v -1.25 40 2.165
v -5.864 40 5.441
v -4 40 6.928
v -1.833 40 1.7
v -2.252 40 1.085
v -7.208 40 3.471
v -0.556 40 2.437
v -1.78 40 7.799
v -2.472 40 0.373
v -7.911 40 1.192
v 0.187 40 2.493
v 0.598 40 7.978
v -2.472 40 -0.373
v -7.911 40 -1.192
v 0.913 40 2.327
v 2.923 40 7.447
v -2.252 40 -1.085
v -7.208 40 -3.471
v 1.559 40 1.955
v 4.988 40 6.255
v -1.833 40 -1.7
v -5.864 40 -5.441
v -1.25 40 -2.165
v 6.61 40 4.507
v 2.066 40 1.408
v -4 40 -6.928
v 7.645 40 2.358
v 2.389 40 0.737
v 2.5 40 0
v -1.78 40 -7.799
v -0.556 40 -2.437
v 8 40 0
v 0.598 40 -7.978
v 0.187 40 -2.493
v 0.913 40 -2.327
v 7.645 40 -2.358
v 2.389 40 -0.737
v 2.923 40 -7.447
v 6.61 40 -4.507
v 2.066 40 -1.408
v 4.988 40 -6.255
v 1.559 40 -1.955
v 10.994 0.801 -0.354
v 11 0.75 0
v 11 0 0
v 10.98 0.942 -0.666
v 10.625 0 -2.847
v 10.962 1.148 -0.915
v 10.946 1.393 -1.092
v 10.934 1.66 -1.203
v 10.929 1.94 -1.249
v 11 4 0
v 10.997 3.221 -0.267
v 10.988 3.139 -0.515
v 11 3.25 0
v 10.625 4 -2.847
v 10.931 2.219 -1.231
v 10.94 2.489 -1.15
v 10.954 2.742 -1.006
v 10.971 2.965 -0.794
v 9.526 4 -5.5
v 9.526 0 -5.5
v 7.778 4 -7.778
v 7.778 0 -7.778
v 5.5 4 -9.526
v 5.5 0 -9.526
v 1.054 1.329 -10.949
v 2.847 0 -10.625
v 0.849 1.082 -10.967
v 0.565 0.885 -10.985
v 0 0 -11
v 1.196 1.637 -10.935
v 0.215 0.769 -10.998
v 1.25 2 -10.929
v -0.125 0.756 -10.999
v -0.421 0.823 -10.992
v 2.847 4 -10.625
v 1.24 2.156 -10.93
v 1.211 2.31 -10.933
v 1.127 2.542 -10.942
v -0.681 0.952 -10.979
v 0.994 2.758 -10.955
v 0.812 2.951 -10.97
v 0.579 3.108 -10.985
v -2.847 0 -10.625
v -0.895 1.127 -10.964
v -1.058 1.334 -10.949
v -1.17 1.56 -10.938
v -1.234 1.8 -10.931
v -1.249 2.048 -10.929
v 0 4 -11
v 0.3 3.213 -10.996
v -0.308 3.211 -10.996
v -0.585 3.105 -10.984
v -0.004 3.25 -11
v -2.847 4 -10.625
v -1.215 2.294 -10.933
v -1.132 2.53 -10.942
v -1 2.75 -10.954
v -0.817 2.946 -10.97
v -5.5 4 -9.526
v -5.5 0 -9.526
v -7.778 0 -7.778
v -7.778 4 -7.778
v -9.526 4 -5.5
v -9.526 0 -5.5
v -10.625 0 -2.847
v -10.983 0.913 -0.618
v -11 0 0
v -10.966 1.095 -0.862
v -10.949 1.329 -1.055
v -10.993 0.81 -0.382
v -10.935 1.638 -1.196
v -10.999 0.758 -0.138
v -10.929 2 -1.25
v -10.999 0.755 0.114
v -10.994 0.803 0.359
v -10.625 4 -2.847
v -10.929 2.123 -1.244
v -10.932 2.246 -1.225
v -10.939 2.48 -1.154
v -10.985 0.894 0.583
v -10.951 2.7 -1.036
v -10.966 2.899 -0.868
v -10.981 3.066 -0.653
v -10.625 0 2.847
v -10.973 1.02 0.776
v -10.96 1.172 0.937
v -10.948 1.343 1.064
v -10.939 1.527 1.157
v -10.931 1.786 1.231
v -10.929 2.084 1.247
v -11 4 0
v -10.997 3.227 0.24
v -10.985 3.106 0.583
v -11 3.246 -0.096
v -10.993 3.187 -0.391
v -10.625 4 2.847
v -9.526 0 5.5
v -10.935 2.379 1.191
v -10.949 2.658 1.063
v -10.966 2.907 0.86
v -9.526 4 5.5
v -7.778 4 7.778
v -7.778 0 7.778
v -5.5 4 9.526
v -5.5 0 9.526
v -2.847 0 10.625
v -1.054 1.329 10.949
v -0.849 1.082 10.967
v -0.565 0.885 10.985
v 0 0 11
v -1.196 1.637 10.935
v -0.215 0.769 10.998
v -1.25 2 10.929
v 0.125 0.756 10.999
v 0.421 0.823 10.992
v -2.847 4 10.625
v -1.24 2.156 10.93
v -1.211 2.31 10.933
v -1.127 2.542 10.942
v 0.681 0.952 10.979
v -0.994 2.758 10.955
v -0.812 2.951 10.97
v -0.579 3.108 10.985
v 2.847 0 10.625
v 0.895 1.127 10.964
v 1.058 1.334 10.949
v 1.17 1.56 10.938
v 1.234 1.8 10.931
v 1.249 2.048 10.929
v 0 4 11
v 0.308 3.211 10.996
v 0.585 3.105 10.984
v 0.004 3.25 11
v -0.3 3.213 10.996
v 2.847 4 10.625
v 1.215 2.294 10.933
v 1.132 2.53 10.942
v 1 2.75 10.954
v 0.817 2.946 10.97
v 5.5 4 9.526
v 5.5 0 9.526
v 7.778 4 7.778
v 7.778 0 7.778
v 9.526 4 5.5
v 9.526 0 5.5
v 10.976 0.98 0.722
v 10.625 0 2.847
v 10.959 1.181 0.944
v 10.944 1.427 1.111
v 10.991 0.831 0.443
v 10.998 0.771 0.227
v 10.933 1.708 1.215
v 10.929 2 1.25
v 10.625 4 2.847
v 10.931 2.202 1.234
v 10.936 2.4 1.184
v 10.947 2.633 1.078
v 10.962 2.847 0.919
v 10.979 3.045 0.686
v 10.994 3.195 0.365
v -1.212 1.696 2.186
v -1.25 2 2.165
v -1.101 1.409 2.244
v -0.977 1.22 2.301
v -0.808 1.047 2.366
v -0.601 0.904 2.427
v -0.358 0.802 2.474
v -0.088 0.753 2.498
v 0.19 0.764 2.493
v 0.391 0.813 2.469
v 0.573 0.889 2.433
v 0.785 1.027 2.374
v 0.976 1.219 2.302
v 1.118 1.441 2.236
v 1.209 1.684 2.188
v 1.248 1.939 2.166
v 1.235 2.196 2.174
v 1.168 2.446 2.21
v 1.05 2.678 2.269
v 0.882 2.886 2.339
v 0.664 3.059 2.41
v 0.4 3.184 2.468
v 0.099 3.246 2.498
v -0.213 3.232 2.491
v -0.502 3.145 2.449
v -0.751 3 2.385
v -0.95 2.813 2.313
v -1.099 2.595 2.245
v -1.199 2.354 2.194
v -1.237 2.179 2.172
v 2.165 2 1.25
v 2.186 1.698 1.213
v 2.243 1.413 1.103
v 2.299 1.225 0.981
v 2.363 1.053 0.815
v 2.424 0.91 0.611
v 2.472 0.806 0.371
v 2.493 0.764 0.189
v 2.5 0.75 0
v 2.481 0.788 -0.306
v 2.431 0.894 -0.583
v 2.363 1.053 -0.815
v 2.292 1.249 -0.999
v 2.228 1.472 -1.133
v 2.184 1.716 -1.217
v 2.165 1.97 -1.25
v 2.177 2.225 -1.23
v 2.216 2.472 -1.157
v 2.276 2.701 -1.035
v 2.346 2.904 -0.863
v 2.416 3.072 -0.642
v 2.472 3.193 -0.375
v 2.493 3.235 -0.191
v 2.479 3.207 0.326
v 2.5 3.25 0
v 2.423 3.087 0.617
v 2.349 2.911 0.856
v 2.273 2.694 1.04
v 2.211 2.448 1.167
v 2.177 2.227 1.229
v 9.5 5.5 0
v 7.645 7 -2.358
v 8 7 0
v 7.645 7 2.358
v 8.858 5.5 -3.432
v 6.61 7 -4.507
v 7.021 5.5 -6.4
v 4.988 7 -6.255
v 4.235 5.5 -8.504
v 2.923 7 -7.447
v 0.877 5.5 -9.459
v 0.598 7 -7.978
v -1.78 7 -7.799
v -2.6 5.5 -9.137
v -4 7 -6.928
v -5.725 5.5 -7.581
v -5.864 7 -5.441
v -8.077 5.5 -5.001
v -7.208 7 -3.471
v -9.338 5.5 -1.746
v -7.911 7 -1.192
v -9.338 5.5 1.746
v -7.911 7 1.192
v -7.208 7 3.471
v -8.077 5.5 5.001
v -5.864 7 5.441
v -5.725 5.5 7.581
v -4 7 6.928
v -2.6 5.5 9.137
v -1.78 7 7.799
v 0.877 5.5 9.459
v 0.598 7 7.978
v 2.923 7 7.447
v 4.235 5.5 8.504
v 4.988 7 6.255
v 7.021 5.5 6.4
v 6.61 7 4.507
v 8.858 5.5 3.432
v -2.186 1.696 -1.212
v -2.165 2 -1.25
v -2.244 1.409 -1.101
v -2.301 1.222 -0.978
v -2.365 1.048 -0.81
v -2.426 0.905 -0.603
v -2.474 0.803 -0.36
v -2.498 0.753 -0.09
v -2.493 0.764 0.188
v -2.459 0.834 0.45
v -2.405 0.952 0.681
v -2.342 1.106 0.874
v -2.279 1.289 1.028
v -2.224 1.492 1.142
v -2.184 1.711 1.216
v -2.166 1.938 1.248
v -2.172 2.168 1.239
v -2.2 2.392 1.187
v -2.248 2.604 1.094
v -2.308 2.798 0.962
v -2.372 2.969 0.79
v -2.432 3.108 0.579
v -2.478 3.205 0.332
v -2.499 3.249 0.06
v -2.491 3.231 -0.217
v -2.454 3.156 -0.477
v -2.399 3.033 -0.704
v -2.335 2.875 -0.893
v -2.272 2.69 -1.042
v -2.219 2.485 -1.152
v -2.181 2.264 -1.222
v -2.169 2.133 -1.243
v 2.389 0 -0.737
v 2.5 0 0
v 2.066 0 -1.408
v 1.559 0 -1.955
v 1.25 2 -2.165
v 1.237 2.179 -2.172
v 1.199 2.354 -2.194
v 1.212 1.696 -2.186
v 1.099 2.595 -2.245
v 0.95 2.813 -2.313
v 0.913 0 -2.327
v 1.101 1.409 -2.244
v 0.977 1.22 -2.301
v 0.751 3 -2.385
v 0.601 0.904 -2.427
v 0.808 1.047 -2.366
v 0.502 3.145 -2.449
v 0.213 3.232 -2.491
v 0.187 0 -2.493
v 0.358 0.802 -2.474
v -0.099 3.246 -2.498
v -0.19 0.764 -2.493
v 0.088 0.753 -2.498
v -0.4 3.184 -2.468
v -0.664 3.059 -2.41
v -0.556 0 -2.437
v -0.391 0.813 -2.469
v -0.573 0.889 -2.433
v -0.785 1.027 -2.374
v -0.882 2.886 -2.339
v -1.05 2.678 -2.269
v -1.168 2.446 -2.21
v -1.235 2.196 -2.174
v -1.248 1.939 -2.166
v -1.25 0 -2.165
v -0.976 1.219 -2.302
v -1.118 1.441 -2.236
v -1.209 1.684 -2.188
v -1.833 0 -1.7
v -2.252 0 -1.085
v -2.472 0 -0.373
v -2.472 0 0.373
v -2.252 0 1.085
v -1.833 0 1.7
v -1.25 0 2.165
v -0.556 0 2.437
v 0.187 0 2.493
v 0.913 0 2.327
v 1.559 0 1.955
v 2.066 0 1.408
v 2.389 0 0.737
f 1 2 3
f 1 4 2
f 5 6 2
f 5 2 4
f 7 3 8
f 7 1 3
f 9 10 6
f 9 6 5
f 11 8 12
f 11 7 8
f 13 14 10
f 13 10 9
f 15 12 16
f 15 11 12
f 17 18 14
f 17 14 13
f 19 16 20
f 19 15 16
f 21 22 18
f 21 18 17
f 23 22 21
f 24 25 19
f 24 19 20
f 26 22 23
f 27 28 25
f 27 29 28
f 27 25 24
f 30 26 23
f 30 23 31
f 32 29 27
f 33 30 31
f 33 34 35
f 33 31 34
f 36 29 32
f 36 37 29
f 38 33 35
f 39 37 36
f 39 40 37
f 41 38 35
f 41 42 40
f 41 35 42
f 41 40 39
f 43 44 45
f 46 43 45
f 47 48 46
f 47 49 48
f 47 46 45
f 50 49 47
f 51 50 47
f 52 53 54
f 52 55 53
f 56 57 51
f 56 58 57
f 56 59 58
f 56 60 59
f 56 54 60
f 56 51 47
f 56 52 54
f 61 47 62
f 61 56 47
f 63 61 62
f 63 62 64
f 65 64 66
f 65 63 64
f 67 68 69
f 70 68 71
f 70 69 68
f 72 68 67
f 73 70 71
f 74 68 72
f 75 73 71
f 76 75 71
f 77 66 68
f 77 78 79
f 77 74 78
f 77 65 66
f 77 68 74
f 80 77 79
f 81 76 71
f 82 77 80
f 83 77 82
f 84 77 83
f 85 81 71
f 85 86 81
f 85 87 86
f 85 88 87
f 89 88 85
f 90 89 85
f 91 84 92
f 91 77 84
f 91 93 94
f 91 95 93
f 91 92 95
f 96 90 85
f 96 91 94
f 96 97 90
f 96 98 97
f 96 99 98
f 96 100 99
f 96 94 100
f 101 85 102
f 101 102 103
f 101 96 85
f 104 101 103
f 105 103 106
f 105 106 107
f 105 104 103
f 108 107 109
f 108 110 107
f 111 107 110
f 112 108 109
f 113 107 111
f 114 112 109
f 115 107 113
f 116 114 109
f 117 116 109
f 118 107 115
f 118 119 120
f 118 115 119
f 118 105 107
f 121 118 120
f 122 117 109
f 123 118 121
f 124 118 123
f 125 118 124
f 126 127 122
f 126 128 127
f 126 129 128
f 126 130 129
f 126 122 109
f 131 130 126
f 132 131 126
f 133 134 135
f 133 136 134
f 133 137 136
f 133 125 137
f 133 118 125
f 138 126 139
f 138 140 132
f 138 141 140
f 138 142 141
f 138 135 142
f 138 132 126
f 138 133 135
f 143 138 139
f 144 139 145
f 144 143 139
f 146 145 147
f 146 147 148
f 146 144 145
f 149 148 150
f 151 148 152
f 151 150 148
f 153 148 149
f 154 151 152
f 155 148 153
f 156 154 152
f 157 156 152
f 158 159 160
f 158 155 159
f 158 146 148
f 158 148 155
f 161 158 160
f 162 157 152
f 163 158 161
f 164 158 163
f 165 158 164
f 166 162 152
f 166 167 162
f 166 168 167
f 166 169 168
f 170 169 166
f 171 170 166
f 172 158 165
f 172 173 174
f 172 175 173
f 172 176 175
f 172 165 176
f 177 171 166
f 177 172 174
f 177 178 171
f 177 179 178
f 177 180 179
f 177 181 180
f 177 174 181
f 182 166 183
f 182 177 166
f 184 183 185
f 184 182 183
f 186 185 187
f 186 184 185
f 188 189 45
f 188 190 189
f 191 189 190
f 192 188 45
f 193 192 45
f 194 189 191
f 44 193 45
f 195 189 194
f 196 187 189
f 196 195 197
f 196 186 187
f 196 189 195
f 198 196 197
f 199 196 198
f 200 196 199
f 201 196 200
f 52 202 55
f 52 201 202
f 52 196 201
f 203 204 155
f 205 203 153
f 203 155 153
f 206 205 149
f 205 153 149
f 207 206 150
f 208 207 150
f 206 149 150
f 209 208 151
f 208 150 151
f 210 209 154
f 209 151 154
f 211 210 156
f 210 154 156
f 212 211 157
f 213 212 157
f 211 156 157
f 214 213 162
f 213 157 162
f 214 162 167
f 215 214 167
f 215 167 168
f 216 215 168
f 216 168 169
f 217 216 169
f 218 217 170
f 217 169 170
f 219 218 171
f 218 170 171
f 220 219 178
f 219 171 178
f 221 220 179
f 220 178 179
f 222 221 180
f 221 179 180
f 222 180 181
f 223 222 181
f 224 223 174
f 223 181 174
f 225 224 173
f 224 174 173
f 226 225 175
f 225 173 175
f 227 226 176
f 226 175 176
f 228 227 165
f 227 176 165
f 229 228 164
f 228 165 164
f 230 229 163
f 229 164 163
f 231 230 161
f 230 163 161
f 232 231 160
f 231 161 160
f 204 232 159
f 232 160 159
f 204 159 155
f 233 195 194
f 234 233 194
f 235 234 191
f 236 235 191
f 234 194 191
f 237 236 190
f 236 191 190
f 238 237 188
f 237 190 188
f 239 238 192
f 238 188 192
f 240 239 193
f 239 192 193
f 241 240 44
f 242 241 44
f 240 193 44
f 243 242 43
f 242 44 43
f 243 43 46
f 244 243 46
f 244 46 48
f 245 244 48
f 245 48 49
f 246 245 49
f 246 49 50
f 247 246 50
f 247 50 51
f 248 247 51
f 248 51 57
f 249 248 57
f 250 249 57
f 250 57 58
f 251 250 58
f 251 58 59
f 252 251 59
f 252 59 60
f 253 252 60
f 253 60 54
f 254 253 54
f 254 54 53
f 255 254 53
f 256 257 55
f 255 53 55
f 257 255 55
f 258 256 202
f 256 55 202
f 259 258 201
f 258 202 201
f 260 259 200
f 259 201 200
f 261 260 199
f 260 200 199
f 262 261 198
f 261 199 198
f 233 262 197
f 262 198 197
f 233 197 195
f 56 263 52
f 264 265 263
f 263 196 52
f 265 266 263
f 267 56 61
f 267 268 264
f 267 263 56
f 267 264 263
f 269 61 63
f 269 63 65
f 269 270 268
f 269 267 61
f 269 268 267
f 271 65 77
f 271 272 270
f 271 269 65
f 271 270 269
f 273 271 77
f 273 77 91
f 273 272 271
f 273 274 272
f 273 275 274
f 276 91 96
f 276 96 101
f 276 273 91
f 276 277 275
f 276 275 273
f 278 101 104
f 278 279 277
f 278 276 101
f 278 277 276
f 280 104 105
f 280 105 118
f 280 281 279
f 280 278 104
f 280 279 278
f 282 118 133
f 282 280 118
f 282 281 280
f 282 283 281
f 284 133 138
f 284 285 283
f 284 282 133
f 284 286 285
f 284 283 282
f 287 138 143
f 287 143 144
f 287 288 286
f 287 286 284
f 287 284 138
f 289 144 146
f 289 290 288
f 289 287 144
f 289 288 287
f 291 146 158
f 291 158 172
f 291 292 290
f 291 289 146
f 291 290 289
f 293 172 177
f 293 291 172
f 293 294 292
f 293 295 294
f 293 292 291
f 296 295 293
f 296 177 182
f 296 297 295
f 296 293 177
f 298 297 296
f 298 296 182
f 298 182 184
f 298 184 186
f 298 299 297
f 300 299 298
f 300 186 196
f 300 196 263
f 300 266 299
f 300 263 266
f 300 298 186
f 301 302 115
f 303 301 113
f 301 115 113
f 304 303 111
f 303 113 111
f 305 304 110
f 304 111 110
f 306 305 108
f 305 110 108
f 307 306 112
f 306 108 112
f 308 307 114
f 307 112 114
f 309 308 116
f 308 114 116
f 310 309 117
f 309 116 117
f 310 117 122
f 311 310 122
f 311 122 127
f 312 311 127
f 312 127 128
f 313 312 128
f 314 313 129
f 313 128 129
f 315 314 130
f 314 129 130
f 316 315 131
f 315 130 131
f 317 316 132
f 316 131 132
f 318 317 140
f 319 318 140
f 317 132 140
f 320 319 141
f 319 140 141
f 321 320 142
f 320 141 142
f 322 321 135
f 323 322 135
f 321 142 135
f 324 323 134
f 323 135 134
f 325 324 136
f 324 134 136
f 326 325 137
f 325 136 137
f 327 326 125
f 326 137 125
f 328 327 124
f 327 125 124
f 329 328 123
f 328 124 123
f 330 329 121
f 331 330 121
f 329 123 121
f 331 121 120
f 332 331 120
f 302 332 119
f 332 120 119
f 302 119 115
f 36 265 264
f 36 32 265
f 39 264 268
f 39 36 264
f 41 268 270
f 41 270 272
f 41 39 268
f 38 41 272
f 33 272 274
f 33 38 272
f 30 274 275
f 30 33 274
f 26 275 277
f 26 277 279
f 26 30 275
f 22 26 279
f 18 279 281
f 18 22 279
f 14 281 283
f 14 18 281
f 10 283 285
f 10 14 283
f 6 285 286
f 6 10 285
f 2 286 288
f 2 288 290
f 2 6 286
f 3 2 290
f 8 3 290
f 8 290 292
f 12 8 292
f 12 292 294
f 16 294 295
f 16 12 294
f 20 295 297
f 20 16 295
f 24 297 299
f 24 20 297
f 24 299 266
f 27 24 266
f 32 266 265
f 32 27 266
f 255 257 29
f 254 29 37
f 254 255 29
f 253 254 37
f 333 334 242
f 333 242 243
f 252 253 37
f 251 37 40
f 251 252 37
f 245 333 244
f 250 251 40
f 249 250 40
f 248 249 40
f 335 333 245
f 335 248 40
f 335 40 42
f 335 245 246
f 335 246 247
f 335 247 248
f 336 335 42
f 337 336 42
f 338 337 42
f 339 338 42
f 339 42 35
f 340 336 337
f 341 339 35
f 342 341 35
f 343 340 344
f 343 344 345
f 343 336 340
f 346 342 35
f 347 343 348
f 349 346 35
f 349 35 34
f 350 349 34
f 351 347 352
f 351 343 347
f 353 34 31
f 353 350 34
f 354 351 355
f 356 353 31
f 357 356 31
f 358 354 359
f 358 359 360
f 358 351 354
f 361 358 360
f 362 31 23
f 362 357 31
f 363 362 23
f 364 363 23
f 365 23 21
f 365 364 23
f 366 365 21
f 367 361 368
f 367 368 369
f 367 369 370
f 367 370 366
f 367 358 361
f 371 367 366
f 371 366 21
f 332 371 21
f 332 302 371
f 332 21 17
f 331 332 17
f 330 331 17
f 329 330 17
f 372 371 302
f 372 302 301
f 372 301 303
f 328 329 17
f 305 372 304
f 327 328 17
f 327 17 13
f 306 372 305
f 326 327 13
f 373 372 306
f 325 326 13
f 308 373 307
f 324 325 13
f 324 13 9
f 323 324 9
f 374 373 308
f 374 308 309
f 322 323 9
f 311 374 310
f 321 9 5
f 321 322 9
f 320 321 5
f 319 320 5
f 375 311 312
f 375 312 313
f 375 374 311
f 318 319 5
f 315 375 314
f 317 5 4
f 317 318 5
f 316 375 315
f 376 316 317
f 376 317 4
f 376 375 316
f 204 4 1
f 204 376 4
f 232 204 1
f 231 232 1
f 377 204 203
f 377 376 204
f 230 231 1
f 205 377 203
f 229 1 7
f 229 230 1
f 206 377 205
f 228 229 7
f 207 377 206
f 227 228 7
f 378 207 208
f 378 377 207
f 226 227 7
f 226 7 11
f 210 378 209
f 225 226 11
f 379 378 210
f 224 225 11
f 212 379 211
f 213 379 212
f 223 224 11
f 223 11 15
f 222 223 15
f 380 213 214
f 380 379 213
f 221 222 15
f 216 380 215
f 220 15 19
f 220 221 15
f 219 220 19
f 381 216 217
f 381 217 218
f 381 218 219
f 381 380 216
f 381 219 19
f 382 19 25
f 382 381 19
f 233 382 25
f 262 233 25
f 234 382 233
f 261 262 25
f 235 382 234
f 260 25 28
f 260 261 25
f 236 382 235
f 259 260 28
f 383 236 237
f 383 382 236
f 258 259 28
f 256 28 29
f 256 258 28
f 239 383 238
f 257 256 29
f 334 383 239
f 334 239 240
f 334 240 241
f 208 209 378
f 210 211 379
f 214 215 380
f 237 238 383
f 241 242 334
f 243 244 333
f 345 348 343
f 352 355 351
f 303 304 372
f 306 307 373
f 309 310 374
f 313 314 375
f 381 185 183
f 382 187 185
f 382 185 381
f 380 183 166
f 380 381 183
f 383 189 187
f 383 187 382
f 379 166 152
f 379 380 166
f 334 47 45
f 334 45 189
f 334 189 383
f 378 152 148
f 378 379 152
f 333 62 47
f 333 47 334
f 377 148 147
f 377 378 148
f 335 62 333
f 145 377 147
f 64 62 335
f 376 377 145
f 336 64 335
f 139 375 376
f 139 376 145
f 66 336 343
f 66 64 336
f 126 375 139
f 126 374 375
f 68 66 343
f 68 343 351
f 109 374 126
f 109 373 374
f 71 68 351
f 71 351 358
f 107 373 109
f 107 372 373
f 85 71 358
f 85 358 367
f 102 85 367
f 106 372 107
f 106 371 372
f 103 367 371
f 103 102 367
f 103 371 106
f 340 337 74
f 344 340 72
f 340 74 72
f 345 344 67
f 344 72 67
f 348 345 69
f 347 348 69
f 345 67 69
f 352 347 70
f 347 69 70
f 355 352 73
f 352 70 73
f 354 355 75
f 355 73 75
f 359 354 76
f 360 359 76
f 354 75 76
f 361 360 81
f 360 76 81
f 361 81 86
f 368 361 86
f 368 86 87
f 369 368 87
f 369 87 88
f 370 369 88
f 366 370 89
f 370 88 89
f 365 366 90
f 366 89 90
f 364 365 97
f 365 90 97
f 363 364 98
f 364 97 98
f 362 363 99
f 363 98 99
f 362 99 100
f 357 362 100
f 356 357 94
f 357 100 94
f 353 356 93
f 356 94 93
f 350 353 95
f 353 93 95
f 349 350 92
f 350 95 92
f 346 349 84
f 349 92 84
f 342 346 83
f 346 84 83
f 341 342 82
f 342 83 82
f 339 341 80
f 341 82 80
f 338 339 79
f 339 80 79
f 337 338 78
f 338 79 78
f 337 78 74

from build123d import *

# Parameters (mm, degrees)
SKETCH13_W        = 1.25
SKETCH13_H        = 11
CIRPATTERN1_COUNT = 4


with BuildPart() as part:
    # Sketch11 → Revolve1 (revolve)
    with BuildSketch(Plane.XY):
        Polygon((8, 40), (2.5, 40), (2.5, 0), (11, 0), (11, 4), (8, 7), (8, 35), align=None)
    revolve(axis=Axis((0, 0, 0), (0, 1, 0)))

    # Sketch13 → M3x0.5 Tapped Hole1 (revolve, cut)
    with BuildSketch(Plane(origin=(0, 2, 0), x_dir=(0, 0, -1), z_dir=(0, 1, 0))):
        with Locations((0.625, 5.5)):
            Rectangle(SKETCH13_W, SKETCH13_H)
    m3x0_5_tapped_hole1 = revolve(axis=Axis((6.35, 2, 0), (-1, 0, 0)), mode=Mode.SUBTRACT)

    # CirPattern1: M3x0.5 Tapped Hole1 ×4 about axis
    cirpattern1_axis = Axis((0, 0, 0), (0, -1, 0))
    for i in range(1, CIRPATTERN1_COUNT):
        add(m3x0_5_tapped_hole1.rotate(cirpattern1_axis, i * 360 / CIRPATTERN1_COUNT), mode=Mode.SUBTRACT)


solid = part.part
